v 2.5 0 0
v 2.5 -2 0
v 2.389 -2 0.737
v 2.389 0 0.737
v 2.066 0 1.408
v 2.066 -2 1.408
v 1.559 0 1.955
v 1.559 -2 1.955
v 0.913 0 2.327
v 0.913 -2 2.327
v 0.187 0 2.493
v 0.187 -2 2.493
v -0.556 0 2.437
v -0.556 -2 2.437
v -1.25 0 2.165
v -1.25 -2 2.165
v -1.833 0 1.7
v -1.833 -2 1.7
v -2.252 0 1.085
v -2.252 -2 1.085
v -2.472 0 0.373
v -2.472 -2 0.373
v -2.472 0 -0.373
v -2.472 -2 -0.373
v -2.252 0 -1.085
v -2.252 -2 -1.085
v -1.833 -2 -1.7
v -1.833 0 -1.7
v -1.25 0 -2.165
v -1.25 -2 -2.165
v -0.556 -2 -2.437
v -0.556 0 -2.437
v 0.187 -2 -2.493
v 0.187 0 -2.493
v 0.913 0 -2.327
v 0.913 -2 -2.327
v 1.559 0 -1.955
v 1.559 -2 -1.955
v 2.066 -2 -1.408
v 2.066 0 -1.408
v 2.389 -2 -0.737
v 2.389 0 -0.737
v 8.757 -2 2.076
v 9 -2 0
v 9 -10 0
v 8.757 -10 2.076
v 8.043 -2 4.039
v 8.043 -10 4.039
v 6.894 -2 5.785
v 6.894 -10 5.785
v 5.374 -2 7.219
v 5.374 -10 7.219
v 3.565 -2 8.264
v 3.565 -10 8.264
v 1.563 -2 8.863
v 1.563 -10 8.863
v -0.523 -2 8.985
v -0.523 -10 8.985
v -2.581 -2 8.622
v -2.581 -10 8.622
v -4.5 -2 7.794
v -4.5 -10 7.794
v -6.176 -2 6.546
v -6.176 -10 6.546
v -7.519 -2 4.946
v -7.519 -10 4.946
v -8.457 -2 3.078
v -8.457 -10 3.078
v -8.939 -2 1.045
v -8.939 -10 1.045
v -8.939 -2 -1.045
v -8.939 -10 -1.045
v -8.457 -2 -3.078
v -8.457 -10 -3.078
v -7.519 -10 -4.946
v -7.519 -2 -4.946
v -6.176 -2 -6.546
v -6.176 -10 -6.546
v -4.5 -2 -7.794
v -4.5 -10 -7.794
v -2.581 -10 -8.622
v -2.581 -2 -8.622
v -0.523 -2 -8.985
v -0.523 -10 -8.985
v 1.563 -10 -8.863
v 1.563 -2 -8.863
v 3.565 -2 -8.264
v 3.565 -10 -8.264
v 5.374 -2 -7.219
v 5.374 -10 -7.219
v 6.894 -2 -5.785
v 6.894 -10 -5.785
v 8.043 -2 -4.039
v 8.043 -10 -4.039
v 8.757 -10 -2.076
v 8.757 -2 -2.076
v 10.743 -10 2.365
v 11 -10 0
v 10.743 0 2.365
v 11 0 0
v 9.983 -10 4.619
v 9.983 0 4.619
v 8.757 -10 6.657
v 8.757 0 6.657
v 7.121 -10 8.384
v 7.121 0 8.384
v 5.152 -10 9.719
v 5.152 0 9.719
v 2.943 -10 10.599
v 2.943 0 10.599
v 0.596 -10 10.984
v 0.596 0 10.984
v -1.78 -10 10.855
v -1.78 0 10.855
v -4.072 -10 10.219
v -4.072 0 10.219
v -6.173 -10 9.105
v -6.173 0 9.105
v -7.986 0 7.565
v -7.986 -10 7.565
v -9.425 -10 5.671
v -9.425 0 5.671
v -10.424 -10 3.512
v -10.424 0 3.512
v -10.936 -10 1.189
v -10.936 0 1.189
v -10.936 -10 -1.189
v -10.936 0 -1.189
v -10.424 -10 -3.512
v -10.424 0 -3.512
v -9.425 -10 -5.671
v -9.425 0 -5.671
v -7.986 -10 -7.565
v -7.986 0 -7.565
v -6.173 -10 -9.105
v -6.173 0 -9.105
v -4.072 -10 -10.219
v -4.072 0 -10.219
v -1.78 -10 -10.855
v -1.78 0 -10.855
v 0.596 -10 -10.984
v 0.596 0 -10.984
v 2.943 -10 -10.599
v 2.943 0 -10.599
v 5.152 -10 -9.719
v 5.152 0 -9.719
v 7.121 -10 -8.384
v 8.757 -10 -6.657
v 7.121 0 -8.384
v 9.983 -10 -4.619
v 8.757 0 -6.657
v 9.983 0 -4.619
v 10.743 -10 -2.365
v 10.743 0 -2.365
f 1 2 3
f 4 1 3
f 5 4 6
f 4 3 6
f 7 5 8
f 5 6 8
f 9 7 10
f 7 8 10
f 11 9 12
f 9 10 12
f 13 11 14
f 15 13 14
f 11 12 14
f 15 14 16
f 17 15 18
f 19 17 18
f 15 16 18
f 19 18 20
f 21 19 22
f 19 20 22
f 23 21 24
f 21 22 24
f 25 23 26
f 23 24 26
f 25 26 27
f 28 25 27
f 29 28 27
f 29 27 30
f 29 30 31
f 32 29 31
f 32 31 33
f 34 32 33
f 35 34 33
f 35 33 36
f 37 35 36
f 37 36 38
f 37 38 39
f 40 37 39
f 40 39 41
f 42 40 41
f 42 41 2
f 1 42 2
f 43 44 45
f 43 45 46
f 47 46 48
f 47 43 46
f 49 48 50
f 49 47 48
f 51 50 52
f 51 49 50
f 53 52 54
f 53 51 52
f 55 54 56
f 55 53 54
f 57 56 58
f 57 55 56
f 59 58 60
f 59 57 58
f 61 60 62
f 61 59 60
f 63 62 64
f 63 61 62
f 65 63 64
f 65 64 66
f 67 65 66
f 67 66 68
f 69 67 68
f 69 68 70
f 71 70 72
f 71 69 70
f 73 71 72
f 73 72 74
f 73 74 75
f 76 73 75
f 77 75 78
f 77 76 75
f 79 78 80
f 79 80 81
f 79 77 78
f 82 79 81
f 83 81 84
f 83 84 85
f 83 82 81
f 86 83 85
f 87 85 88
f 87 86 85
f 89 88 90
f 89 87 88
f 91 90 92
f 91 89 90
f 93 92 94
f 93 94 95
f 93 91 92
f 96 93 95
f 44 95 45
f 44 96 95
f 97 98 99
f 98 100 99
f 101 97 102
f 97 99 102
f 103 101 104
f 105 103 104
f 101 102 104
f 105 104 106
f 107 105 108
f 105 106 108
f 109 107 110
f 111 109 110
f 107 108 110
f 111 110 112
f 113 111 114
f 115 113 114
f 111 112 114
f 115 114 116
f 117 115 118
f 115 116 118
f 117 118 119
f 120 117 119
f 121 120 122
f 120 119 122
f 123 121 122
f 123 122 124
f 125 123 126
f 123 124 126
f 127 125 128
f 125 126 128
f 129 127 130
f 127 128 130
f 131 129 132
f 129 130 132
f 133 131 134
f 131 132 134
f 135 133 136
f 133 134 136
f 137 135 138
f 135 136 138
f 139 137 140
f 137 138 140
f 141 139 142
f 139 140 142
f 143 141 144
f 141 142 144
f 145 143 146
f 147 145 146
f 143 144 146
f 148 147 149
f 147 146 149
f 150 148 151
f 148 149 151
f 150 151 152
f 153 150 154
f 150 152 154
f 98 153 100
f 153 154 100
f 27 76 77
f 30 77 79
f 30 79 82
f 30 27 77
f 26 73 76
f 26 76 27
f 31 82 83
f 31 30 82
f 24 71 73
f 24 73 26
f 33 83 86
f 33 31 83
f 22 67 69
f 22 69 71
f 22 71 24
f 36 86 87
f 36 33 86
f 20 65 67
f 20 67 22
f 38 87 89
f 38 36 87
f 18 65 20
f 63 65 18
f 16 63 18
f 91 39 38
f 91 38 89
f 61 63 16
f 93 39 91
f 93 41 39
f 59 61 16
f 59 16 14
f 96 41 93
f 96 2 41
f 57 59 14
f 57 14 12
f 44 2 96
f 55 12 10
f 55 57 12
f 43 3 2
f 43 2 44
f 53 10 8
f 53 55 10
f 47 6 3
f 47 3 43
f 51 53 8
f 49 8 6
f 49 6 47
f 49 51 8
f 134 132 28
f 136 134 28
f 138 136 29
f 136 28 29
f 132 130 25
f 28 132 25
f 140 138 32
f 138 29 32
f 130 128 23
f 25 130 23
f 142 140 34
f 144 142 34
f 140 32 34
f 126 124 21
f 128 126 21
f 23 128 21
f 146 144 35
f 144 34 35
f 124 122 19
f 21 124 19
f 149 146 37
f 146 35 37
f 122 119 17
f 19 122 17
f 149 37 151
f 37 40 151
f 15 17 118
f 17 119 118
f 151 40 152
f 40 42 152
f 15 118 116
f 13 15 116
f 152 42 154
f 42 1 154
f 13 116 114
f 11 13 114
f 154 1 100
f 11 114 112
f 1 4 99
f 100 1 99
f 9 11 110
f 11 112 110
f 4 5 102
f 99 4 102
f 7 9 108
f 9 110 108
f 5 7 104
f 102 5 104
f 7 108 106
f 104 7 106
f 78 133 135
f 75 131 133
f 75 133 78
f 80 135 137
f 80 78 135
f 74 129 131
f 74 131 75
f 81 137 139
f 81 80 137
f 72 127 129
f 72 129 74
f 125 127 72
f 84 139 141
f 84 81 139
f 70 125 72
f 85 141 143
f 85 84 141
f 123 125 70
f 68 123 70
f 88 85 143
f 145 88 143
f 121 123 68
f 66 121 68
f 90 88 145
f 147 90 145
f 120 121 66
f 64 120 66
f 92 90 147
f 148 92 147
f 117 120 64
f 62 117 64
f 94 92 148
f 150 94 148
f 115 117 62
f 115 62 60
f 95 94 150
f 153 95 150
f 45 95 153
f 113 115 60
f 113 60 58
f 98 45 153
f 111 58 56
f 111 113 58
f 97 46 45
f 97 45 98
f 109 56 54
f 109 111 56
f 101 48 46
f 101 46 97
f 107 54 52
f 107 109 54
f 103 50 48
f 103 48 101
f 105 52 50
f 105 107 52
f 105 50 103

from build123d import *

# Parameters (mm, degrees)
F0_R     = 11
F1_DEPTH = 2
F2_R     = 2.5
F3_DEPTH = 25
F4_R     = 11
F4_R_2   = 9
F5_DEPTH = 8


with BuildPart() as f1:
    # F0 (on Front) → F1 (new body)
    with BuildSketch(Plane.XZ):
        Circle(F0_R)
    extrude(amount=F1_DEPTH)

    # F2 (on face) → F3 (cut)
    with BuildSketch(Plane.XZ.offset(2)):
        Circle(F2_R)
    extrude(amount=-F3_DEPTH, mode=Mode.SUBTRACT)

    # F4 (on face) → F5 (join)
    with BuildSketch(Plane.XZ.offset(2)):
        Circle(F4_R)
        Circle(F4_R_2, mode=Mode.SUBTRACT)
    extrude(amount=F5_DEPTH)


solid = f1.part
